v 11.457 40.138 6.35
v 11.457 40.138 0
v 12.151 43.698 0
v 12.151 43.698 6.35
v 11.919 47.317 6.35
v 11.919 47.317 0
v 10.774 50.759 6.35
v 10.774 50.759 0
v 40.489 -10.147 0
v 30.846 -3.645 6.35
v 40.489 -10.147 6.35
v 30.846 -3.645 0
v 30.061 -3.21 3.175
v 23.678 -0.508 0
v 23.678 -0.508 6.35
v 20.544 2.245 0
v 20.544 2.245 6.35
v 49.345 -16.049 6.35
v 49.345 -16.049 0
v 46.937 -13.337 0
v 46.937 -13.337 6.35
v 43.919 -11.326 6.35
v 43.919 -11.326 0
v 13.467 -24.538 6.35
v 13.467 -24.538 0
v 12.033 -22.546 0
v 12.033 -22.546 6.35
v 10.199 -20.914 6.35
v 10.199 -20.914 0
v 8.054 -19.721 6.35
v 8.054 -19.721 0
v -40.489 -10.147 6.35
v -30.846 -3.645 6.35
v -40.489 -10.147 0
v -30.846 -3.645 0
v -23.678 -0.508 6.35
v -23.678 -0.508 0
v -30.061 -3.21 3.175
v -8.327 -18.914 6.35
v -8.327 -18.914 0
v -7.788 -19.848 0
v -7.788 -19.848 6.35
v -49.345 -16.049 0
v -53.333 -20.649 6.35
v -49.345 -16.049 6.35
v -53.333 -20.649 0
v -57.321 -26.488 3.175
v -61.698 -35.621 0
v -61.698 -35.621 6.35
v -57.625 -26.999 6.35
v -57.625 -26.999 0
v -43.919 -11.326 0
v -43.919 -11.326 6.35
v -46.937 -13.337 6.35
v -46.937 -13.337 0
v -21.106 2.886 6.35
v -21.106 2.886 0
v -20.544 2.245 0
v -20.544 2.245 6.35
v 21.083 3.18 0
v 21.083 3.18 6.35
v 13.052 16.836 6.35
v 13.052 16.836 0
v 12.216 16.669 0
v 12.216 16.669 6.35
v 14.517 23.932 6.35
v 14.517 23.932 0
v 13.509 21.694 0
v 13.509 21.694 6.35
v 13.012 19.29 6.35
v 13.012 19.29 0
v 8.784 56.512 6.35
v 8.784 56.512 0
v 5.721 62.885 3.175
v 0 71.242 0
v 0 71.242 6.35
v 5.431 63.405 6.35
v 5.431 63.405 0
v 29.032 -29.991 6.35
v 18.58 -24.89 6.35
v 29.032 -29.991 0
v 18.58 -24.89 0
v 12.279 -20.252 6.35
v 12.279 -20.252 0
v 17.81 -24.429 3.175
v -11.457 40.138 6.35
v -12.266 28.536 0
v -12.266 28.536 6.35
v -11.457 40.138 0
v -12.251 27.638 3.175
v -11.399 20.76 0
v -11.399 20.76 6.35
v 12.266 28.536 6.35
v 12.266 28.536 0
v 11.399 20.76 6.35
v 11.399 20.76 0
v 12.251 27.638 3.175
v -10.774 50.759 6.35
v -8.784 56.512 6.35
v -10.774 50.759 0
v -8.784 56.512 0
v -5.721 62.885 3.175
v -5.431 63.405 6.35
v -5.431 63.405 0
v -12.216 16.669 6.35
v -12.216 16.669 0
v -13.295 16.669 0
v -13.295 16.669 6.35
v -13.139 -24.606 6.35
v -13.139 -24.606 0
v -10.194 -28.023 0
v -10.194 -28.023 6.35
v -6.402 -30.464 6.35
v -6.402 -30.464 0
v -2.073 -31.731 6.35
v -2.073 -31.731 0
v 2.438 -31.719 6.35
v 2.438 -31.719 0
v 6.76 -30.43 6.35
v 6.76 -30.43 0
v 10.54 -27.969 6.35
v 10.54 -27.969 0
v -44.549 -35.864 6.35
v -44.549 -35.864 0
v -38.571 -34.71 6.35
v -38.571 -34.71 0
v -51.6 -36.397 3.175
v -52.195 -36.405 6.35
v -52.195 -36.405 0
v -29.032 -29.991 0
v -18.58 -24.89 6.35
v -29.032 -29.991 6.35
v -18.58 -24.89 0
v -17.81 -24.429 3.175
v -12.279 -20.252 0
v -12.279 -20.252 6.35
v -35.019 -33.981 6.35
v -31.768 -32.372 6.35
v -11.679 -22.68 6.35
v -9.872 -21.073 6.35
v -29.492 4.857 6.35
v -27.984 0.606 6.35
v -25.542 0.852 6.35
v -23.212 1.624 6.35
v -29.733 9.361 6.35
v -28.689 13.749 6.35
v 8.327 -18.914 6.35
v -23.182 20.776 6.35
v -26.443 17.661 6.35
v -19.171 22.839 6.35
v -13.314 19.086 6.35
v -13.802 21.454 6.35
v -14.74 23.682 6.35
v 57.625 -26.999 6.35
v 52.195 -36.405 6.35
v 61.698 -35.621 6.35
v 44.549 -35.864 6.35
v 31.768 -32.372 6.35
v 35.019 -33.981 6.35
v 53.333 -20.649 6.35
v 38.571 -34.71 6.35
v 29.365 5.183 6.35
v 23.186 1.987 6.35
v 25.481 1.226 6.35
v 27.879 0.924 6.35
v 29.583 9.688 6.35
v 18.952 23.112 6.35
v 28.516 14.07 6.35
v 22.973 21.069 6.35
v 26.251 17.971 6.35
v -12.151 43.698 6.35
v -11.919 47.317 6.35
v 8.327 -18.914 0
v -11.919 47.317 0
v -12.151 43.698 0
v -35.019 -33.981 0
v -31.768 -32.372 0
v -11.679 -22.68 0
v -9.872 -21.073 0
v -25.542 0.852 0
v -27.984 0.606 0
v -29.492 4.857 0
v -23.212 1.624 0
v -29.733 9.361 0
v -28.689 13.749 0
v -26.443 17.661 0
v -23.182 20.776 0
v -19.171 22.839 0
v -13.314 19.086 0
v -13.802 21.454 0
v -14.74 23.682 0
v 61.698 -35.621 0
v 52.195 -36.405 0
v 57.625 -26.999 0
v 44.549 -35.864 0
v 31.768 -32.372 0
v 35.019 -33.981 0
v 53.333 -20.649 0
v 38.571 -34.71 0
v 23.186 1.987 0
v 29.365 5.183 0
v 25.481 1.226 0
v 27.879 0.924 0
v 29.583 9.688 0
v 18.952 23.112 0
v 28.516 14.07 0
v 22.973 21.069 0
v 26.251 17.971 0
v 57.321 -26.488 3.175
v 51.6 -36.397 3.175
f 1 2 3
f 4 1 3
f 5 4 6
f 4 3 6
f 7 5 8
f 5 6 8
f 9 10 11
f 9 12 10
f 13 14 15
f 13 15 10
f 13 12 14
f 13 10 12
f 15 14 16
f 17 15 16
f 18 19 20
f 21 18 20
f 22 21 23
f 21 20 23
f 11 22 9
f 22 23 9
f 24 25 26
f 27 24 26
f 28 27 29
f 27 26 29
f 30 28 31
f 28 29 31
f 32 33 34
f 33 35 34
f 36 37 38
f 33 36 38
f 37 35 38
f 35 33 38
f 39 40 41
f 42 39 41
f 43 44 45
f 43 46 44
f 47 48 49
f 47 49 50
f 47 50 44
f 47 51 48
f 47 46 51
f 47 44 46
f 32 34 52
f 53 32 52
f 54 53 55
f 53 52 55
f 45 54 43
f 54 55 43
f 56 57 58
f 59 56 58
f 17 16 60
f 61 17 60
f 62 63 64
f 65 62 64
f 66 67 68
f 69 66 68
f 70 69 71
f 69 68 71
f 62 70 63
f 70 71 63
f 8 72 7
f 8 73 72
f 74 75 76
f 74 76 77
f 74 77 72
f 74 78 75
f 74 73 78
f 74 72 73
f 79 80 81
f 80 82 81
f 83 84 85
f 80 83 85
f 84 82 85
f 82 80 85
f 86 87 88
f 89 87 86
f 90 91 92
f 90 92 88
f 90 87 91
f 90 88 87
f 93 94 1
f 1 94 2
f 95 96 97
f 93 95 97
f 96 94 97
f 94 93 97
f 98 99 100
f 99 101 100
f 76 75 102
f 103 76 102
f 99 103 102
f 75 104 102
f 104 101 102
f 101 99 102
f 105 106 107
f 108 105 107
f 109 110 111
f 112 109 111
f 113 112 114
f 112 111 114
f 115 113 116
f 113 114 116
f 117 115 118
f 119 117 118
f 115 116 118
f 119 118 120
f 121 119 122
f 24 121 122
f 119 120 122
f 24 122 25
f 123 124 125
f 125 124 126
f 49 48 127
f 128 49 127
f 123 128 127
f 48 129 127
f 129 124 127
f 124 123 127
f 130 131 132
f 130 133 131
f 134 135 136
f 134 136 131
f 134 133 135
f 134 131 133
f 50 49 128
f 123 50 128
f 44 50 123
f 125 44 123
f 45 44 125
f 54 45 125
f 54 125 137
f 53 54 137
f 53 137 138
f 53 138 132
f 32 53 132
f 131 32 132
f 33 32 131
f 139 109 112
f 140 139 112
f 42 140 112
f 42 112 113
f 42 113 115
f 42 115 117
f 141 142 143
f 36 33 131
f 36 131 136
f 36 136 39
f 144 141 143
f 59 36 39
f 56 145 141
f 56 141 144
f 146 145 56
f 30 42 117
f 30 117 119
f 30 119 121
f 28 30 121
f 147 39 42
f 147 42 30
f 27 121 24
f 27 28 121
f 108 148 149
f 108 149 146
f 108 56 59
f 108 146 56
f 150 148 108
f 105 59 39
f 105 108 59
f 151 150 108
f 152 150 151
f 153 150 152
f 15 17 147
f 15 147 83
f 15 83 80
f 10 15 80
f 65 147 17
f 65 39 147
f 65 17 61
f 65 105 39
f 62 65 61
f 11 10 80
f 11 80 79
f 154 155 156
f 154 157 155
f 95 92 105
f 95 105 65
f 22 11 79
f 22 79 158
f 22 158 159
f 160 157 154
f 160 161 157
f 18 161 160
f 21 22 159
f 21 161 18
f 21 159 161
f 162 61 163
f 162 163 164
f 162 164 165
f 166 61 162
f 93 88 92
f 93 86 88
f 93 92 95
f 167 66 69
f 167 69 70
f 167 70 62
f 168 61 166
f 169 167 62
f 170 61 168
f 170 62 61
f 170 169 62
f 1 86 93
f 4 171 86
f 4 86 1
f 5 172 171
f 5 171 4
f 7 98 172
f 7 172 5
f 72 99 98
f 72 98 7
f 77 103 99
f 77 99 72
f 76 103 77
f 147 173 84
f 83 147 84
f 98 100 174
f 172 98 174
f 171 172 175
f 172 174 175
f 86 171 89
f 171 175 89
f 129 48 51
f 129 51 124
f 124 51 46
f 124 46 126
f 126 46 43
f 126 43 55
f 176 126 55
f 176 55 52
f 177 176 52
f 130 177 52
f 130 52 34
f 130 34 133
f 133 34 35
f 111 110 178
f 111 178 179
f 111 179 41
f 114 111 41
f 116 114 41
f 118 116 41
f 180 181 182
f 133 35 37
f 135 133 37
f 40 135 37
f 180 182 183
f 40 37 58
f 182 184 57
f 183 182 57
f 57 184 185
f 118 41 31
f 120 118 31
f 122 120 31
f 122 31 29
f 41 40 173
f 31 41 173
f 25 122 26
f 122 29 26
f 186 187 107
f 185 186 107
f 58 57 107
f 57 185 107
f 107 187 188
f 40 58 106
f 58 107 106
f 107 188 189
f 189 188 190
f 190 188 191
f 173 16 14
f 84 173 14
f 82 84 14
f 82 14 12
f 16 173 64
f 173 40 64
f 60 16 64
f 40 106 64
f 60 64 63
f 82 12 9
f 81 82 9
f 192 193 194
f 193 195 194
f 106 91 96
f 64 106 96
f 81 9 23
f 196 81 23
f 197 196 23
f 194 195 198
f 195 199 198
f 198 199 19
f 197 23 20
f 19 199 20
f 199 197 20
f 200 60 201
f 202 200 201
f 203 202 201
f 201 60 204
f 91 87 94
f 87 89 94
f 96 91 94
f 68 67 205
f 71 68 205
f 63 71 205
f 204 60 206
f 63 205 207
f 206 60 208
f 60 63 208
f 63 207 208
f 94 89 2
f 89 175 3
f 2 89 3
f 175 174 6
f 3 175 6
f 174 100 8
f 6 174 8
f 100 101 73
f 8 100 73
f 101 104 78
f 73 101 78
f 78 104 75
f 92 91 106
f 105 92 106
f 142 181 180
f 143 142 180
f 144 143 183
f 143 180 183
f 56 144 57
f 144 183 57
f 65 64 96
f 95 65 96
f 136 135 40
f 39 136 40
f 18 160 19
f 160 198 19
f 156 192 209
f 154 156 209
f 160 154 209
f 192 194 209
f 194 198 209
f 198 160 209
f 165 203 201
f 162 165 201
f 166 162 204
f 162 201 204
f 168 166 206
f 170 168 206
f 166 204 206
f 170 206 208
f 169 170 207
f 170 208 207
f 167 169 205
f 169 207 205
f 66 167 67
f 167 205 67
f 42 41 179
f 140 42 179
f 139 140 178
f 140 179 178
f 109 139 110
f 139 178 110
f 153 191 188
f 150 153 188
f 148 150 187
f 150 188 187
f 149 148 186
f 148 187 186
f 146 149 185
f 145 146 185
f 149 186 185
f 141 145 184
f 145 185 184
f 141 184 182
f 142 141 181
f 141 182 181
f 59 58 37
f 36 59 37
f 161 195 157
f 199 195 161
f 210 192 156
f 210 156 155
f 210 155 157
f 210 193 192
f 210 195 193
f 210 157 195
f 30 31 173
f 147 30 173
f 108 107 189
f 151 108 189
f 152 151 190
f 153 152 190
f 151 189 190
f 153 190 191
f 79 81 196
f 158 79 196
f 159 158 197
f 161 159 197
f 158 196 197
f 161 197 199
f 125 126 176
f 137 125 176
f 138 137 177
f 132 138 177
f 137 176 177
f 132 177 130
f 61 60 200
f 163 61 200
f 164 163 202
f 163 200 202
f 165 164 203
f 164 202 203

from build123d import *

# Parameters (mm, degrees)
F1_DEPTH = 6.35


with BuildPart() as f1:
    # F0 (on Top) → F1 (new body)
    with BuildSketch(Plane.XY):
        with BuildLine():
            add(Edge.make_bspline(
                [(0, 71.2421610951), (-1.8717980289, 68.832793782), (-5.9054940485, 63.7394567312), (-10.2932083579, 53.2239591481), (-10.7742816294, 50.7587112719)],
                knots=[0, 0, 0, 0, 0.3881776272, 0.8302867615, 0.8302867615, 0.8302867615, 0.8302867615], degree=3))
            ThreePointArc((-10.7742816294, 50.7587112719), (-12.151414509, 45.5150408691), (-11.4572210078, 40.1381765744))
            add(Edge.make_bspline(
                [(-11.3991048065, 20.7600555156), (-11.7325351971, 22.9101453469), (-12.7530584769, 27.8294481961), (-11.8366984864, 35.6693833545), (-11.4572210078, 40.1381765744)],
                knots=[0, 0, 0, 0, 0.426568444, 1, 1, 1, 1], degree=3))
            Line((-11.3991048065, 20.7600555156), (-12.216145647, 16.6687367736))
            Line((-12.216145647, 16.6687367736), (-20.5436223185, 2.2451240799))
            Line((-20.5436223185, 2.2451240799), (-8.3274766714, -18.9138608535))
            Line((-8.3274766714, -18.9138608535), (8.3274766714, -18.9138608535))
            Line((8.3274766714, -18.9138608535), (20.5436223185, 2.2451240799))
            Line((20.5436223185, 2.2451240799), (12.216145647, 16.6687367736))
            Line((12.216145647, 16.6687367736), (11.3991048065, 20.7600555156))
            add(Edge.make_bspline(
                [(11.3991048065, 20.7600555156), (11.7325351971, 22.9101453469), (12.7530584769, 27.8294481961), (11.8366984864, 35.6693833545), (11.4572210078, 40.1381765744)],
                knots=[0, 0, 0, 0, 0.426568444, 1, 1, 1, 1], degree=3))
            ThreePointArc((11.4572210078, 40.1381765744), (12.151414509, 45.5150408691), (10.7742816294, 50.7587112719))
            add(Edge.make_bspline(
                [(0, 71.2421610951), (1.8717980289, 68.832793782), (5.9054940485, 63.7394567312), (10.2932083579, 53.2239591481), (10.7742816294, 50.7587112719)],
                knots=[0, 0, 0, 0, 0.3881776272, 0.8302867615, 0.8302867615, 0.8302867615, 0.8302867615], degree=3))
        make_face()
        with BuildLine():
            Line((-20.5436223185, 2.2451240799), (-12.216145647, 16.6687367736))
            Line((-12.216145647, 16.6687367736), (-13.2953060188, 16.6687367736))
            ThreePointArc((-13.2953060188, 16.6687367736), (-13.4997773753, 20.2820878122), (-14.7402806158, 23.6819798654))
            ThreePointArc((-14.7402806158, 23.6819798654), (-27.7067627464, 15.7853712662), (-27.984043385, 0.6061353941))
            ThreePointArc((-27.984043385, 0.6061353941), (-24.3555326782, 1.1738561923), (-21.1061885939, 2.885627169))
            Line((-21.1061885939, 2.885627169), (-20.5436223185, 2.2451240799))
        make_face()
        with BuildLine():
            Line((-8.3274766714, -18.9138608535), (-20.5436223185, 2.2451240799))
            Line((-20.5436223185, 2.2451240799), (-23.6782878637, -0.508113415))
            add(Edge.make_bspline(
                [(-23.6782878637, -0.508113415), (-25.7070354734, -1.294399142), (-30.4775383496, -2.8702514812), (-36.8089413655, -7.5838100911), (-40.4892910789, -10.1468438377)],
                knots=[0, 0, 0, 0, 0.426568444, 1, 1, 1, 1], degree=3))
            ThreePointArc((-40.4892910789, -10.1468438377), (-45.4928889014, -12.2340867779), (-49.3454742395, -16.0485540373))
            add(Edge.make_bspline(
                [(-61.6975213289, -35.6210805476), (-60.5468470431, -32.7953722472), (-58.1527357769, -26.7554204977), (-51.2399048911, -17.6977996497), (-49.3454742395, -16.0485540373)],
                knots=[0, 0, 0, 0, 0.3881776272, 0.8302867615, 0.8302867615, 0.8302867615, 0.8302867615], degree=3))
            add(Edge.make_bspline(
                [(-61.6975213289, -35.6210805476), (-58.6750490142, -36.0374215348), (-52.2472417284, -36.9840362335), (-40.9466965333, -35.5261594984), (-38.5711926101, -34.7101572345)],
                knots=[0, 0, 0, 0, 0.3881776272, 0.8302867615, 0.8302867615, 0.8302867615, 0.8302867615], degree=3))
            ThreePointArc((-38.5711926101, -34.7101572345), (-33.3414743924, -33.2809540912), (-29.0320700711, -29.9913327367))
            add(Edge.make_bspline(
                [(-12.2791830572, -20.2519421006), (-13.9745002763, -21.6157462049), (-17.7244798727, -24.959196715), (-24.9722428792, -28.0855732634), (-29.0320700711, -29.9913327367)],
                knots=[0, 0, 0, 0, 0.426568444, 1, 1, 1, 1], degree=3))
            Line((-12.2791830572, -20.2519421006), (-8.3274766714, -18.9138608535))
        make_face()
        with BuildLine():
            Line((8.3274766714, -18.9138608535), (-8.3274766714, -18.9138608535))
            Line((-8.3274766714, -18.9138608535), (-7.7878964856, -19.8484411502))
            ThreePointArc((-7.7878964856, -19.8484411502), (-10.8149145995, -21.8321940585), (-13.1390558675, -24.6064474049))
            ThreePointArc((-13.1390558675, -24.6064474049), (0.1828488485, -31.8874460281), (13.4670930431, -24.5379601691))
            ThreePointArc((13.4670930431, -24.5379601691), (11.1611770562, -21.6794381182), (8.0540678628, -19.7213090839))
            Line((8.0540678628, -19.7213090839), (8.3274766714, -18.9138608535))
        make_face()
        with BuildLine():
            Line((20.5436223185, 2.2451240799), (8.3274766714, -18.9138608535))
            Line((8.3274766714, -18.9138608535), (12.2791830572, -20.2519421006))
            add(Edge.make_bspline(
                [(12.2791830572, -20.2519421006), (13.9745002763, -21.6157462049), (17.7244798727, -24.959196715), (24.9722428792, -28.0855732634), (29.0320700711, -29.9913327367)],
                knots=[0, 0, 0, 0, 0.426568444, 1, 1, 1, 1], degree=3))
            ThreePointArc((29.0320700711, -29.9913327367), (33.3414743924, -33.2809540912), (38.5711926101, -34.7101572345))
            add(Edge.make_bspline(
                [(61.6975213289, -35.6210805476), (58.6750490142, -36.0374215348), (52.2472417284, -36.9840362335), (40.9466965333, -35.5261594984), (38.5711926101, -34.7101572345)],
                knots=[0, 0, 0, 0, 0.3881776272, 0.8302867615, 0.8302867615, 0.8302867615, 0.8302867615], degree=3))
            add(Edge.make_bspline(
                [(61.6975213289, -35.6210805476), (60.5468470431, -32.7953722472), (58.1527357769, -26.7554204977), (51.2399048911, -17.6977996497), (49.3454742395, -16.0485540373)],
                knots=[0, 0, 0, 0, 0.3881776272, 0.8302867615, 0.8302867615, 0.8302867615, 0.8302867615], degree=3))
            ThreePointArc((49.3454742395, -16.0485540373), (45.4928889014, -12.2340867779), (40.4892910789, -10.1468438377))
            add(Edge.make_bspline(
                [(23.6782878637, -0.508113415), (25.7070354734, -1.294399142), (30.4775383496, -2.8702514812), (36.8089413655, -7.5838100911), (40.4892910789, -10.1468438377)],
                knots=[0, 0, 0, 0, 0.426568444, 1, 1, 1, 1], degree=3))
            Line((23.6782878637, -0.508113415), (20.5436223185, 2.2451240799))
        make_face()
        with BuildLine():
            Line((13.0521207311, 16.8356819149), (12.216145647, 16.6687367736))
            Line((12.216145647, 16.6687367736), (20.5436223185, 2.2451240799))
            Line((20.5436223185, 2.2451240799), (21.0832025044, 3.1797043765))
            ThreePointArc((21.0832025044, 3.1797043765), (24.3146919748, 1.5501062464), (27.8793364832, 0.9244675395))
            ThreePointArc((27.8793364832, 0.9244675395), (27.5239138979, 16.1020747619), (14.516950342, 23.931824775))
            ThreePointArc((14.516950342, 23.931824775), (13.194355622, 20.5055819259), (13.0521207311, 16.8356819149))
        make_face()
    extrude(amount=F1_DEPTH)


solid = f1.part
